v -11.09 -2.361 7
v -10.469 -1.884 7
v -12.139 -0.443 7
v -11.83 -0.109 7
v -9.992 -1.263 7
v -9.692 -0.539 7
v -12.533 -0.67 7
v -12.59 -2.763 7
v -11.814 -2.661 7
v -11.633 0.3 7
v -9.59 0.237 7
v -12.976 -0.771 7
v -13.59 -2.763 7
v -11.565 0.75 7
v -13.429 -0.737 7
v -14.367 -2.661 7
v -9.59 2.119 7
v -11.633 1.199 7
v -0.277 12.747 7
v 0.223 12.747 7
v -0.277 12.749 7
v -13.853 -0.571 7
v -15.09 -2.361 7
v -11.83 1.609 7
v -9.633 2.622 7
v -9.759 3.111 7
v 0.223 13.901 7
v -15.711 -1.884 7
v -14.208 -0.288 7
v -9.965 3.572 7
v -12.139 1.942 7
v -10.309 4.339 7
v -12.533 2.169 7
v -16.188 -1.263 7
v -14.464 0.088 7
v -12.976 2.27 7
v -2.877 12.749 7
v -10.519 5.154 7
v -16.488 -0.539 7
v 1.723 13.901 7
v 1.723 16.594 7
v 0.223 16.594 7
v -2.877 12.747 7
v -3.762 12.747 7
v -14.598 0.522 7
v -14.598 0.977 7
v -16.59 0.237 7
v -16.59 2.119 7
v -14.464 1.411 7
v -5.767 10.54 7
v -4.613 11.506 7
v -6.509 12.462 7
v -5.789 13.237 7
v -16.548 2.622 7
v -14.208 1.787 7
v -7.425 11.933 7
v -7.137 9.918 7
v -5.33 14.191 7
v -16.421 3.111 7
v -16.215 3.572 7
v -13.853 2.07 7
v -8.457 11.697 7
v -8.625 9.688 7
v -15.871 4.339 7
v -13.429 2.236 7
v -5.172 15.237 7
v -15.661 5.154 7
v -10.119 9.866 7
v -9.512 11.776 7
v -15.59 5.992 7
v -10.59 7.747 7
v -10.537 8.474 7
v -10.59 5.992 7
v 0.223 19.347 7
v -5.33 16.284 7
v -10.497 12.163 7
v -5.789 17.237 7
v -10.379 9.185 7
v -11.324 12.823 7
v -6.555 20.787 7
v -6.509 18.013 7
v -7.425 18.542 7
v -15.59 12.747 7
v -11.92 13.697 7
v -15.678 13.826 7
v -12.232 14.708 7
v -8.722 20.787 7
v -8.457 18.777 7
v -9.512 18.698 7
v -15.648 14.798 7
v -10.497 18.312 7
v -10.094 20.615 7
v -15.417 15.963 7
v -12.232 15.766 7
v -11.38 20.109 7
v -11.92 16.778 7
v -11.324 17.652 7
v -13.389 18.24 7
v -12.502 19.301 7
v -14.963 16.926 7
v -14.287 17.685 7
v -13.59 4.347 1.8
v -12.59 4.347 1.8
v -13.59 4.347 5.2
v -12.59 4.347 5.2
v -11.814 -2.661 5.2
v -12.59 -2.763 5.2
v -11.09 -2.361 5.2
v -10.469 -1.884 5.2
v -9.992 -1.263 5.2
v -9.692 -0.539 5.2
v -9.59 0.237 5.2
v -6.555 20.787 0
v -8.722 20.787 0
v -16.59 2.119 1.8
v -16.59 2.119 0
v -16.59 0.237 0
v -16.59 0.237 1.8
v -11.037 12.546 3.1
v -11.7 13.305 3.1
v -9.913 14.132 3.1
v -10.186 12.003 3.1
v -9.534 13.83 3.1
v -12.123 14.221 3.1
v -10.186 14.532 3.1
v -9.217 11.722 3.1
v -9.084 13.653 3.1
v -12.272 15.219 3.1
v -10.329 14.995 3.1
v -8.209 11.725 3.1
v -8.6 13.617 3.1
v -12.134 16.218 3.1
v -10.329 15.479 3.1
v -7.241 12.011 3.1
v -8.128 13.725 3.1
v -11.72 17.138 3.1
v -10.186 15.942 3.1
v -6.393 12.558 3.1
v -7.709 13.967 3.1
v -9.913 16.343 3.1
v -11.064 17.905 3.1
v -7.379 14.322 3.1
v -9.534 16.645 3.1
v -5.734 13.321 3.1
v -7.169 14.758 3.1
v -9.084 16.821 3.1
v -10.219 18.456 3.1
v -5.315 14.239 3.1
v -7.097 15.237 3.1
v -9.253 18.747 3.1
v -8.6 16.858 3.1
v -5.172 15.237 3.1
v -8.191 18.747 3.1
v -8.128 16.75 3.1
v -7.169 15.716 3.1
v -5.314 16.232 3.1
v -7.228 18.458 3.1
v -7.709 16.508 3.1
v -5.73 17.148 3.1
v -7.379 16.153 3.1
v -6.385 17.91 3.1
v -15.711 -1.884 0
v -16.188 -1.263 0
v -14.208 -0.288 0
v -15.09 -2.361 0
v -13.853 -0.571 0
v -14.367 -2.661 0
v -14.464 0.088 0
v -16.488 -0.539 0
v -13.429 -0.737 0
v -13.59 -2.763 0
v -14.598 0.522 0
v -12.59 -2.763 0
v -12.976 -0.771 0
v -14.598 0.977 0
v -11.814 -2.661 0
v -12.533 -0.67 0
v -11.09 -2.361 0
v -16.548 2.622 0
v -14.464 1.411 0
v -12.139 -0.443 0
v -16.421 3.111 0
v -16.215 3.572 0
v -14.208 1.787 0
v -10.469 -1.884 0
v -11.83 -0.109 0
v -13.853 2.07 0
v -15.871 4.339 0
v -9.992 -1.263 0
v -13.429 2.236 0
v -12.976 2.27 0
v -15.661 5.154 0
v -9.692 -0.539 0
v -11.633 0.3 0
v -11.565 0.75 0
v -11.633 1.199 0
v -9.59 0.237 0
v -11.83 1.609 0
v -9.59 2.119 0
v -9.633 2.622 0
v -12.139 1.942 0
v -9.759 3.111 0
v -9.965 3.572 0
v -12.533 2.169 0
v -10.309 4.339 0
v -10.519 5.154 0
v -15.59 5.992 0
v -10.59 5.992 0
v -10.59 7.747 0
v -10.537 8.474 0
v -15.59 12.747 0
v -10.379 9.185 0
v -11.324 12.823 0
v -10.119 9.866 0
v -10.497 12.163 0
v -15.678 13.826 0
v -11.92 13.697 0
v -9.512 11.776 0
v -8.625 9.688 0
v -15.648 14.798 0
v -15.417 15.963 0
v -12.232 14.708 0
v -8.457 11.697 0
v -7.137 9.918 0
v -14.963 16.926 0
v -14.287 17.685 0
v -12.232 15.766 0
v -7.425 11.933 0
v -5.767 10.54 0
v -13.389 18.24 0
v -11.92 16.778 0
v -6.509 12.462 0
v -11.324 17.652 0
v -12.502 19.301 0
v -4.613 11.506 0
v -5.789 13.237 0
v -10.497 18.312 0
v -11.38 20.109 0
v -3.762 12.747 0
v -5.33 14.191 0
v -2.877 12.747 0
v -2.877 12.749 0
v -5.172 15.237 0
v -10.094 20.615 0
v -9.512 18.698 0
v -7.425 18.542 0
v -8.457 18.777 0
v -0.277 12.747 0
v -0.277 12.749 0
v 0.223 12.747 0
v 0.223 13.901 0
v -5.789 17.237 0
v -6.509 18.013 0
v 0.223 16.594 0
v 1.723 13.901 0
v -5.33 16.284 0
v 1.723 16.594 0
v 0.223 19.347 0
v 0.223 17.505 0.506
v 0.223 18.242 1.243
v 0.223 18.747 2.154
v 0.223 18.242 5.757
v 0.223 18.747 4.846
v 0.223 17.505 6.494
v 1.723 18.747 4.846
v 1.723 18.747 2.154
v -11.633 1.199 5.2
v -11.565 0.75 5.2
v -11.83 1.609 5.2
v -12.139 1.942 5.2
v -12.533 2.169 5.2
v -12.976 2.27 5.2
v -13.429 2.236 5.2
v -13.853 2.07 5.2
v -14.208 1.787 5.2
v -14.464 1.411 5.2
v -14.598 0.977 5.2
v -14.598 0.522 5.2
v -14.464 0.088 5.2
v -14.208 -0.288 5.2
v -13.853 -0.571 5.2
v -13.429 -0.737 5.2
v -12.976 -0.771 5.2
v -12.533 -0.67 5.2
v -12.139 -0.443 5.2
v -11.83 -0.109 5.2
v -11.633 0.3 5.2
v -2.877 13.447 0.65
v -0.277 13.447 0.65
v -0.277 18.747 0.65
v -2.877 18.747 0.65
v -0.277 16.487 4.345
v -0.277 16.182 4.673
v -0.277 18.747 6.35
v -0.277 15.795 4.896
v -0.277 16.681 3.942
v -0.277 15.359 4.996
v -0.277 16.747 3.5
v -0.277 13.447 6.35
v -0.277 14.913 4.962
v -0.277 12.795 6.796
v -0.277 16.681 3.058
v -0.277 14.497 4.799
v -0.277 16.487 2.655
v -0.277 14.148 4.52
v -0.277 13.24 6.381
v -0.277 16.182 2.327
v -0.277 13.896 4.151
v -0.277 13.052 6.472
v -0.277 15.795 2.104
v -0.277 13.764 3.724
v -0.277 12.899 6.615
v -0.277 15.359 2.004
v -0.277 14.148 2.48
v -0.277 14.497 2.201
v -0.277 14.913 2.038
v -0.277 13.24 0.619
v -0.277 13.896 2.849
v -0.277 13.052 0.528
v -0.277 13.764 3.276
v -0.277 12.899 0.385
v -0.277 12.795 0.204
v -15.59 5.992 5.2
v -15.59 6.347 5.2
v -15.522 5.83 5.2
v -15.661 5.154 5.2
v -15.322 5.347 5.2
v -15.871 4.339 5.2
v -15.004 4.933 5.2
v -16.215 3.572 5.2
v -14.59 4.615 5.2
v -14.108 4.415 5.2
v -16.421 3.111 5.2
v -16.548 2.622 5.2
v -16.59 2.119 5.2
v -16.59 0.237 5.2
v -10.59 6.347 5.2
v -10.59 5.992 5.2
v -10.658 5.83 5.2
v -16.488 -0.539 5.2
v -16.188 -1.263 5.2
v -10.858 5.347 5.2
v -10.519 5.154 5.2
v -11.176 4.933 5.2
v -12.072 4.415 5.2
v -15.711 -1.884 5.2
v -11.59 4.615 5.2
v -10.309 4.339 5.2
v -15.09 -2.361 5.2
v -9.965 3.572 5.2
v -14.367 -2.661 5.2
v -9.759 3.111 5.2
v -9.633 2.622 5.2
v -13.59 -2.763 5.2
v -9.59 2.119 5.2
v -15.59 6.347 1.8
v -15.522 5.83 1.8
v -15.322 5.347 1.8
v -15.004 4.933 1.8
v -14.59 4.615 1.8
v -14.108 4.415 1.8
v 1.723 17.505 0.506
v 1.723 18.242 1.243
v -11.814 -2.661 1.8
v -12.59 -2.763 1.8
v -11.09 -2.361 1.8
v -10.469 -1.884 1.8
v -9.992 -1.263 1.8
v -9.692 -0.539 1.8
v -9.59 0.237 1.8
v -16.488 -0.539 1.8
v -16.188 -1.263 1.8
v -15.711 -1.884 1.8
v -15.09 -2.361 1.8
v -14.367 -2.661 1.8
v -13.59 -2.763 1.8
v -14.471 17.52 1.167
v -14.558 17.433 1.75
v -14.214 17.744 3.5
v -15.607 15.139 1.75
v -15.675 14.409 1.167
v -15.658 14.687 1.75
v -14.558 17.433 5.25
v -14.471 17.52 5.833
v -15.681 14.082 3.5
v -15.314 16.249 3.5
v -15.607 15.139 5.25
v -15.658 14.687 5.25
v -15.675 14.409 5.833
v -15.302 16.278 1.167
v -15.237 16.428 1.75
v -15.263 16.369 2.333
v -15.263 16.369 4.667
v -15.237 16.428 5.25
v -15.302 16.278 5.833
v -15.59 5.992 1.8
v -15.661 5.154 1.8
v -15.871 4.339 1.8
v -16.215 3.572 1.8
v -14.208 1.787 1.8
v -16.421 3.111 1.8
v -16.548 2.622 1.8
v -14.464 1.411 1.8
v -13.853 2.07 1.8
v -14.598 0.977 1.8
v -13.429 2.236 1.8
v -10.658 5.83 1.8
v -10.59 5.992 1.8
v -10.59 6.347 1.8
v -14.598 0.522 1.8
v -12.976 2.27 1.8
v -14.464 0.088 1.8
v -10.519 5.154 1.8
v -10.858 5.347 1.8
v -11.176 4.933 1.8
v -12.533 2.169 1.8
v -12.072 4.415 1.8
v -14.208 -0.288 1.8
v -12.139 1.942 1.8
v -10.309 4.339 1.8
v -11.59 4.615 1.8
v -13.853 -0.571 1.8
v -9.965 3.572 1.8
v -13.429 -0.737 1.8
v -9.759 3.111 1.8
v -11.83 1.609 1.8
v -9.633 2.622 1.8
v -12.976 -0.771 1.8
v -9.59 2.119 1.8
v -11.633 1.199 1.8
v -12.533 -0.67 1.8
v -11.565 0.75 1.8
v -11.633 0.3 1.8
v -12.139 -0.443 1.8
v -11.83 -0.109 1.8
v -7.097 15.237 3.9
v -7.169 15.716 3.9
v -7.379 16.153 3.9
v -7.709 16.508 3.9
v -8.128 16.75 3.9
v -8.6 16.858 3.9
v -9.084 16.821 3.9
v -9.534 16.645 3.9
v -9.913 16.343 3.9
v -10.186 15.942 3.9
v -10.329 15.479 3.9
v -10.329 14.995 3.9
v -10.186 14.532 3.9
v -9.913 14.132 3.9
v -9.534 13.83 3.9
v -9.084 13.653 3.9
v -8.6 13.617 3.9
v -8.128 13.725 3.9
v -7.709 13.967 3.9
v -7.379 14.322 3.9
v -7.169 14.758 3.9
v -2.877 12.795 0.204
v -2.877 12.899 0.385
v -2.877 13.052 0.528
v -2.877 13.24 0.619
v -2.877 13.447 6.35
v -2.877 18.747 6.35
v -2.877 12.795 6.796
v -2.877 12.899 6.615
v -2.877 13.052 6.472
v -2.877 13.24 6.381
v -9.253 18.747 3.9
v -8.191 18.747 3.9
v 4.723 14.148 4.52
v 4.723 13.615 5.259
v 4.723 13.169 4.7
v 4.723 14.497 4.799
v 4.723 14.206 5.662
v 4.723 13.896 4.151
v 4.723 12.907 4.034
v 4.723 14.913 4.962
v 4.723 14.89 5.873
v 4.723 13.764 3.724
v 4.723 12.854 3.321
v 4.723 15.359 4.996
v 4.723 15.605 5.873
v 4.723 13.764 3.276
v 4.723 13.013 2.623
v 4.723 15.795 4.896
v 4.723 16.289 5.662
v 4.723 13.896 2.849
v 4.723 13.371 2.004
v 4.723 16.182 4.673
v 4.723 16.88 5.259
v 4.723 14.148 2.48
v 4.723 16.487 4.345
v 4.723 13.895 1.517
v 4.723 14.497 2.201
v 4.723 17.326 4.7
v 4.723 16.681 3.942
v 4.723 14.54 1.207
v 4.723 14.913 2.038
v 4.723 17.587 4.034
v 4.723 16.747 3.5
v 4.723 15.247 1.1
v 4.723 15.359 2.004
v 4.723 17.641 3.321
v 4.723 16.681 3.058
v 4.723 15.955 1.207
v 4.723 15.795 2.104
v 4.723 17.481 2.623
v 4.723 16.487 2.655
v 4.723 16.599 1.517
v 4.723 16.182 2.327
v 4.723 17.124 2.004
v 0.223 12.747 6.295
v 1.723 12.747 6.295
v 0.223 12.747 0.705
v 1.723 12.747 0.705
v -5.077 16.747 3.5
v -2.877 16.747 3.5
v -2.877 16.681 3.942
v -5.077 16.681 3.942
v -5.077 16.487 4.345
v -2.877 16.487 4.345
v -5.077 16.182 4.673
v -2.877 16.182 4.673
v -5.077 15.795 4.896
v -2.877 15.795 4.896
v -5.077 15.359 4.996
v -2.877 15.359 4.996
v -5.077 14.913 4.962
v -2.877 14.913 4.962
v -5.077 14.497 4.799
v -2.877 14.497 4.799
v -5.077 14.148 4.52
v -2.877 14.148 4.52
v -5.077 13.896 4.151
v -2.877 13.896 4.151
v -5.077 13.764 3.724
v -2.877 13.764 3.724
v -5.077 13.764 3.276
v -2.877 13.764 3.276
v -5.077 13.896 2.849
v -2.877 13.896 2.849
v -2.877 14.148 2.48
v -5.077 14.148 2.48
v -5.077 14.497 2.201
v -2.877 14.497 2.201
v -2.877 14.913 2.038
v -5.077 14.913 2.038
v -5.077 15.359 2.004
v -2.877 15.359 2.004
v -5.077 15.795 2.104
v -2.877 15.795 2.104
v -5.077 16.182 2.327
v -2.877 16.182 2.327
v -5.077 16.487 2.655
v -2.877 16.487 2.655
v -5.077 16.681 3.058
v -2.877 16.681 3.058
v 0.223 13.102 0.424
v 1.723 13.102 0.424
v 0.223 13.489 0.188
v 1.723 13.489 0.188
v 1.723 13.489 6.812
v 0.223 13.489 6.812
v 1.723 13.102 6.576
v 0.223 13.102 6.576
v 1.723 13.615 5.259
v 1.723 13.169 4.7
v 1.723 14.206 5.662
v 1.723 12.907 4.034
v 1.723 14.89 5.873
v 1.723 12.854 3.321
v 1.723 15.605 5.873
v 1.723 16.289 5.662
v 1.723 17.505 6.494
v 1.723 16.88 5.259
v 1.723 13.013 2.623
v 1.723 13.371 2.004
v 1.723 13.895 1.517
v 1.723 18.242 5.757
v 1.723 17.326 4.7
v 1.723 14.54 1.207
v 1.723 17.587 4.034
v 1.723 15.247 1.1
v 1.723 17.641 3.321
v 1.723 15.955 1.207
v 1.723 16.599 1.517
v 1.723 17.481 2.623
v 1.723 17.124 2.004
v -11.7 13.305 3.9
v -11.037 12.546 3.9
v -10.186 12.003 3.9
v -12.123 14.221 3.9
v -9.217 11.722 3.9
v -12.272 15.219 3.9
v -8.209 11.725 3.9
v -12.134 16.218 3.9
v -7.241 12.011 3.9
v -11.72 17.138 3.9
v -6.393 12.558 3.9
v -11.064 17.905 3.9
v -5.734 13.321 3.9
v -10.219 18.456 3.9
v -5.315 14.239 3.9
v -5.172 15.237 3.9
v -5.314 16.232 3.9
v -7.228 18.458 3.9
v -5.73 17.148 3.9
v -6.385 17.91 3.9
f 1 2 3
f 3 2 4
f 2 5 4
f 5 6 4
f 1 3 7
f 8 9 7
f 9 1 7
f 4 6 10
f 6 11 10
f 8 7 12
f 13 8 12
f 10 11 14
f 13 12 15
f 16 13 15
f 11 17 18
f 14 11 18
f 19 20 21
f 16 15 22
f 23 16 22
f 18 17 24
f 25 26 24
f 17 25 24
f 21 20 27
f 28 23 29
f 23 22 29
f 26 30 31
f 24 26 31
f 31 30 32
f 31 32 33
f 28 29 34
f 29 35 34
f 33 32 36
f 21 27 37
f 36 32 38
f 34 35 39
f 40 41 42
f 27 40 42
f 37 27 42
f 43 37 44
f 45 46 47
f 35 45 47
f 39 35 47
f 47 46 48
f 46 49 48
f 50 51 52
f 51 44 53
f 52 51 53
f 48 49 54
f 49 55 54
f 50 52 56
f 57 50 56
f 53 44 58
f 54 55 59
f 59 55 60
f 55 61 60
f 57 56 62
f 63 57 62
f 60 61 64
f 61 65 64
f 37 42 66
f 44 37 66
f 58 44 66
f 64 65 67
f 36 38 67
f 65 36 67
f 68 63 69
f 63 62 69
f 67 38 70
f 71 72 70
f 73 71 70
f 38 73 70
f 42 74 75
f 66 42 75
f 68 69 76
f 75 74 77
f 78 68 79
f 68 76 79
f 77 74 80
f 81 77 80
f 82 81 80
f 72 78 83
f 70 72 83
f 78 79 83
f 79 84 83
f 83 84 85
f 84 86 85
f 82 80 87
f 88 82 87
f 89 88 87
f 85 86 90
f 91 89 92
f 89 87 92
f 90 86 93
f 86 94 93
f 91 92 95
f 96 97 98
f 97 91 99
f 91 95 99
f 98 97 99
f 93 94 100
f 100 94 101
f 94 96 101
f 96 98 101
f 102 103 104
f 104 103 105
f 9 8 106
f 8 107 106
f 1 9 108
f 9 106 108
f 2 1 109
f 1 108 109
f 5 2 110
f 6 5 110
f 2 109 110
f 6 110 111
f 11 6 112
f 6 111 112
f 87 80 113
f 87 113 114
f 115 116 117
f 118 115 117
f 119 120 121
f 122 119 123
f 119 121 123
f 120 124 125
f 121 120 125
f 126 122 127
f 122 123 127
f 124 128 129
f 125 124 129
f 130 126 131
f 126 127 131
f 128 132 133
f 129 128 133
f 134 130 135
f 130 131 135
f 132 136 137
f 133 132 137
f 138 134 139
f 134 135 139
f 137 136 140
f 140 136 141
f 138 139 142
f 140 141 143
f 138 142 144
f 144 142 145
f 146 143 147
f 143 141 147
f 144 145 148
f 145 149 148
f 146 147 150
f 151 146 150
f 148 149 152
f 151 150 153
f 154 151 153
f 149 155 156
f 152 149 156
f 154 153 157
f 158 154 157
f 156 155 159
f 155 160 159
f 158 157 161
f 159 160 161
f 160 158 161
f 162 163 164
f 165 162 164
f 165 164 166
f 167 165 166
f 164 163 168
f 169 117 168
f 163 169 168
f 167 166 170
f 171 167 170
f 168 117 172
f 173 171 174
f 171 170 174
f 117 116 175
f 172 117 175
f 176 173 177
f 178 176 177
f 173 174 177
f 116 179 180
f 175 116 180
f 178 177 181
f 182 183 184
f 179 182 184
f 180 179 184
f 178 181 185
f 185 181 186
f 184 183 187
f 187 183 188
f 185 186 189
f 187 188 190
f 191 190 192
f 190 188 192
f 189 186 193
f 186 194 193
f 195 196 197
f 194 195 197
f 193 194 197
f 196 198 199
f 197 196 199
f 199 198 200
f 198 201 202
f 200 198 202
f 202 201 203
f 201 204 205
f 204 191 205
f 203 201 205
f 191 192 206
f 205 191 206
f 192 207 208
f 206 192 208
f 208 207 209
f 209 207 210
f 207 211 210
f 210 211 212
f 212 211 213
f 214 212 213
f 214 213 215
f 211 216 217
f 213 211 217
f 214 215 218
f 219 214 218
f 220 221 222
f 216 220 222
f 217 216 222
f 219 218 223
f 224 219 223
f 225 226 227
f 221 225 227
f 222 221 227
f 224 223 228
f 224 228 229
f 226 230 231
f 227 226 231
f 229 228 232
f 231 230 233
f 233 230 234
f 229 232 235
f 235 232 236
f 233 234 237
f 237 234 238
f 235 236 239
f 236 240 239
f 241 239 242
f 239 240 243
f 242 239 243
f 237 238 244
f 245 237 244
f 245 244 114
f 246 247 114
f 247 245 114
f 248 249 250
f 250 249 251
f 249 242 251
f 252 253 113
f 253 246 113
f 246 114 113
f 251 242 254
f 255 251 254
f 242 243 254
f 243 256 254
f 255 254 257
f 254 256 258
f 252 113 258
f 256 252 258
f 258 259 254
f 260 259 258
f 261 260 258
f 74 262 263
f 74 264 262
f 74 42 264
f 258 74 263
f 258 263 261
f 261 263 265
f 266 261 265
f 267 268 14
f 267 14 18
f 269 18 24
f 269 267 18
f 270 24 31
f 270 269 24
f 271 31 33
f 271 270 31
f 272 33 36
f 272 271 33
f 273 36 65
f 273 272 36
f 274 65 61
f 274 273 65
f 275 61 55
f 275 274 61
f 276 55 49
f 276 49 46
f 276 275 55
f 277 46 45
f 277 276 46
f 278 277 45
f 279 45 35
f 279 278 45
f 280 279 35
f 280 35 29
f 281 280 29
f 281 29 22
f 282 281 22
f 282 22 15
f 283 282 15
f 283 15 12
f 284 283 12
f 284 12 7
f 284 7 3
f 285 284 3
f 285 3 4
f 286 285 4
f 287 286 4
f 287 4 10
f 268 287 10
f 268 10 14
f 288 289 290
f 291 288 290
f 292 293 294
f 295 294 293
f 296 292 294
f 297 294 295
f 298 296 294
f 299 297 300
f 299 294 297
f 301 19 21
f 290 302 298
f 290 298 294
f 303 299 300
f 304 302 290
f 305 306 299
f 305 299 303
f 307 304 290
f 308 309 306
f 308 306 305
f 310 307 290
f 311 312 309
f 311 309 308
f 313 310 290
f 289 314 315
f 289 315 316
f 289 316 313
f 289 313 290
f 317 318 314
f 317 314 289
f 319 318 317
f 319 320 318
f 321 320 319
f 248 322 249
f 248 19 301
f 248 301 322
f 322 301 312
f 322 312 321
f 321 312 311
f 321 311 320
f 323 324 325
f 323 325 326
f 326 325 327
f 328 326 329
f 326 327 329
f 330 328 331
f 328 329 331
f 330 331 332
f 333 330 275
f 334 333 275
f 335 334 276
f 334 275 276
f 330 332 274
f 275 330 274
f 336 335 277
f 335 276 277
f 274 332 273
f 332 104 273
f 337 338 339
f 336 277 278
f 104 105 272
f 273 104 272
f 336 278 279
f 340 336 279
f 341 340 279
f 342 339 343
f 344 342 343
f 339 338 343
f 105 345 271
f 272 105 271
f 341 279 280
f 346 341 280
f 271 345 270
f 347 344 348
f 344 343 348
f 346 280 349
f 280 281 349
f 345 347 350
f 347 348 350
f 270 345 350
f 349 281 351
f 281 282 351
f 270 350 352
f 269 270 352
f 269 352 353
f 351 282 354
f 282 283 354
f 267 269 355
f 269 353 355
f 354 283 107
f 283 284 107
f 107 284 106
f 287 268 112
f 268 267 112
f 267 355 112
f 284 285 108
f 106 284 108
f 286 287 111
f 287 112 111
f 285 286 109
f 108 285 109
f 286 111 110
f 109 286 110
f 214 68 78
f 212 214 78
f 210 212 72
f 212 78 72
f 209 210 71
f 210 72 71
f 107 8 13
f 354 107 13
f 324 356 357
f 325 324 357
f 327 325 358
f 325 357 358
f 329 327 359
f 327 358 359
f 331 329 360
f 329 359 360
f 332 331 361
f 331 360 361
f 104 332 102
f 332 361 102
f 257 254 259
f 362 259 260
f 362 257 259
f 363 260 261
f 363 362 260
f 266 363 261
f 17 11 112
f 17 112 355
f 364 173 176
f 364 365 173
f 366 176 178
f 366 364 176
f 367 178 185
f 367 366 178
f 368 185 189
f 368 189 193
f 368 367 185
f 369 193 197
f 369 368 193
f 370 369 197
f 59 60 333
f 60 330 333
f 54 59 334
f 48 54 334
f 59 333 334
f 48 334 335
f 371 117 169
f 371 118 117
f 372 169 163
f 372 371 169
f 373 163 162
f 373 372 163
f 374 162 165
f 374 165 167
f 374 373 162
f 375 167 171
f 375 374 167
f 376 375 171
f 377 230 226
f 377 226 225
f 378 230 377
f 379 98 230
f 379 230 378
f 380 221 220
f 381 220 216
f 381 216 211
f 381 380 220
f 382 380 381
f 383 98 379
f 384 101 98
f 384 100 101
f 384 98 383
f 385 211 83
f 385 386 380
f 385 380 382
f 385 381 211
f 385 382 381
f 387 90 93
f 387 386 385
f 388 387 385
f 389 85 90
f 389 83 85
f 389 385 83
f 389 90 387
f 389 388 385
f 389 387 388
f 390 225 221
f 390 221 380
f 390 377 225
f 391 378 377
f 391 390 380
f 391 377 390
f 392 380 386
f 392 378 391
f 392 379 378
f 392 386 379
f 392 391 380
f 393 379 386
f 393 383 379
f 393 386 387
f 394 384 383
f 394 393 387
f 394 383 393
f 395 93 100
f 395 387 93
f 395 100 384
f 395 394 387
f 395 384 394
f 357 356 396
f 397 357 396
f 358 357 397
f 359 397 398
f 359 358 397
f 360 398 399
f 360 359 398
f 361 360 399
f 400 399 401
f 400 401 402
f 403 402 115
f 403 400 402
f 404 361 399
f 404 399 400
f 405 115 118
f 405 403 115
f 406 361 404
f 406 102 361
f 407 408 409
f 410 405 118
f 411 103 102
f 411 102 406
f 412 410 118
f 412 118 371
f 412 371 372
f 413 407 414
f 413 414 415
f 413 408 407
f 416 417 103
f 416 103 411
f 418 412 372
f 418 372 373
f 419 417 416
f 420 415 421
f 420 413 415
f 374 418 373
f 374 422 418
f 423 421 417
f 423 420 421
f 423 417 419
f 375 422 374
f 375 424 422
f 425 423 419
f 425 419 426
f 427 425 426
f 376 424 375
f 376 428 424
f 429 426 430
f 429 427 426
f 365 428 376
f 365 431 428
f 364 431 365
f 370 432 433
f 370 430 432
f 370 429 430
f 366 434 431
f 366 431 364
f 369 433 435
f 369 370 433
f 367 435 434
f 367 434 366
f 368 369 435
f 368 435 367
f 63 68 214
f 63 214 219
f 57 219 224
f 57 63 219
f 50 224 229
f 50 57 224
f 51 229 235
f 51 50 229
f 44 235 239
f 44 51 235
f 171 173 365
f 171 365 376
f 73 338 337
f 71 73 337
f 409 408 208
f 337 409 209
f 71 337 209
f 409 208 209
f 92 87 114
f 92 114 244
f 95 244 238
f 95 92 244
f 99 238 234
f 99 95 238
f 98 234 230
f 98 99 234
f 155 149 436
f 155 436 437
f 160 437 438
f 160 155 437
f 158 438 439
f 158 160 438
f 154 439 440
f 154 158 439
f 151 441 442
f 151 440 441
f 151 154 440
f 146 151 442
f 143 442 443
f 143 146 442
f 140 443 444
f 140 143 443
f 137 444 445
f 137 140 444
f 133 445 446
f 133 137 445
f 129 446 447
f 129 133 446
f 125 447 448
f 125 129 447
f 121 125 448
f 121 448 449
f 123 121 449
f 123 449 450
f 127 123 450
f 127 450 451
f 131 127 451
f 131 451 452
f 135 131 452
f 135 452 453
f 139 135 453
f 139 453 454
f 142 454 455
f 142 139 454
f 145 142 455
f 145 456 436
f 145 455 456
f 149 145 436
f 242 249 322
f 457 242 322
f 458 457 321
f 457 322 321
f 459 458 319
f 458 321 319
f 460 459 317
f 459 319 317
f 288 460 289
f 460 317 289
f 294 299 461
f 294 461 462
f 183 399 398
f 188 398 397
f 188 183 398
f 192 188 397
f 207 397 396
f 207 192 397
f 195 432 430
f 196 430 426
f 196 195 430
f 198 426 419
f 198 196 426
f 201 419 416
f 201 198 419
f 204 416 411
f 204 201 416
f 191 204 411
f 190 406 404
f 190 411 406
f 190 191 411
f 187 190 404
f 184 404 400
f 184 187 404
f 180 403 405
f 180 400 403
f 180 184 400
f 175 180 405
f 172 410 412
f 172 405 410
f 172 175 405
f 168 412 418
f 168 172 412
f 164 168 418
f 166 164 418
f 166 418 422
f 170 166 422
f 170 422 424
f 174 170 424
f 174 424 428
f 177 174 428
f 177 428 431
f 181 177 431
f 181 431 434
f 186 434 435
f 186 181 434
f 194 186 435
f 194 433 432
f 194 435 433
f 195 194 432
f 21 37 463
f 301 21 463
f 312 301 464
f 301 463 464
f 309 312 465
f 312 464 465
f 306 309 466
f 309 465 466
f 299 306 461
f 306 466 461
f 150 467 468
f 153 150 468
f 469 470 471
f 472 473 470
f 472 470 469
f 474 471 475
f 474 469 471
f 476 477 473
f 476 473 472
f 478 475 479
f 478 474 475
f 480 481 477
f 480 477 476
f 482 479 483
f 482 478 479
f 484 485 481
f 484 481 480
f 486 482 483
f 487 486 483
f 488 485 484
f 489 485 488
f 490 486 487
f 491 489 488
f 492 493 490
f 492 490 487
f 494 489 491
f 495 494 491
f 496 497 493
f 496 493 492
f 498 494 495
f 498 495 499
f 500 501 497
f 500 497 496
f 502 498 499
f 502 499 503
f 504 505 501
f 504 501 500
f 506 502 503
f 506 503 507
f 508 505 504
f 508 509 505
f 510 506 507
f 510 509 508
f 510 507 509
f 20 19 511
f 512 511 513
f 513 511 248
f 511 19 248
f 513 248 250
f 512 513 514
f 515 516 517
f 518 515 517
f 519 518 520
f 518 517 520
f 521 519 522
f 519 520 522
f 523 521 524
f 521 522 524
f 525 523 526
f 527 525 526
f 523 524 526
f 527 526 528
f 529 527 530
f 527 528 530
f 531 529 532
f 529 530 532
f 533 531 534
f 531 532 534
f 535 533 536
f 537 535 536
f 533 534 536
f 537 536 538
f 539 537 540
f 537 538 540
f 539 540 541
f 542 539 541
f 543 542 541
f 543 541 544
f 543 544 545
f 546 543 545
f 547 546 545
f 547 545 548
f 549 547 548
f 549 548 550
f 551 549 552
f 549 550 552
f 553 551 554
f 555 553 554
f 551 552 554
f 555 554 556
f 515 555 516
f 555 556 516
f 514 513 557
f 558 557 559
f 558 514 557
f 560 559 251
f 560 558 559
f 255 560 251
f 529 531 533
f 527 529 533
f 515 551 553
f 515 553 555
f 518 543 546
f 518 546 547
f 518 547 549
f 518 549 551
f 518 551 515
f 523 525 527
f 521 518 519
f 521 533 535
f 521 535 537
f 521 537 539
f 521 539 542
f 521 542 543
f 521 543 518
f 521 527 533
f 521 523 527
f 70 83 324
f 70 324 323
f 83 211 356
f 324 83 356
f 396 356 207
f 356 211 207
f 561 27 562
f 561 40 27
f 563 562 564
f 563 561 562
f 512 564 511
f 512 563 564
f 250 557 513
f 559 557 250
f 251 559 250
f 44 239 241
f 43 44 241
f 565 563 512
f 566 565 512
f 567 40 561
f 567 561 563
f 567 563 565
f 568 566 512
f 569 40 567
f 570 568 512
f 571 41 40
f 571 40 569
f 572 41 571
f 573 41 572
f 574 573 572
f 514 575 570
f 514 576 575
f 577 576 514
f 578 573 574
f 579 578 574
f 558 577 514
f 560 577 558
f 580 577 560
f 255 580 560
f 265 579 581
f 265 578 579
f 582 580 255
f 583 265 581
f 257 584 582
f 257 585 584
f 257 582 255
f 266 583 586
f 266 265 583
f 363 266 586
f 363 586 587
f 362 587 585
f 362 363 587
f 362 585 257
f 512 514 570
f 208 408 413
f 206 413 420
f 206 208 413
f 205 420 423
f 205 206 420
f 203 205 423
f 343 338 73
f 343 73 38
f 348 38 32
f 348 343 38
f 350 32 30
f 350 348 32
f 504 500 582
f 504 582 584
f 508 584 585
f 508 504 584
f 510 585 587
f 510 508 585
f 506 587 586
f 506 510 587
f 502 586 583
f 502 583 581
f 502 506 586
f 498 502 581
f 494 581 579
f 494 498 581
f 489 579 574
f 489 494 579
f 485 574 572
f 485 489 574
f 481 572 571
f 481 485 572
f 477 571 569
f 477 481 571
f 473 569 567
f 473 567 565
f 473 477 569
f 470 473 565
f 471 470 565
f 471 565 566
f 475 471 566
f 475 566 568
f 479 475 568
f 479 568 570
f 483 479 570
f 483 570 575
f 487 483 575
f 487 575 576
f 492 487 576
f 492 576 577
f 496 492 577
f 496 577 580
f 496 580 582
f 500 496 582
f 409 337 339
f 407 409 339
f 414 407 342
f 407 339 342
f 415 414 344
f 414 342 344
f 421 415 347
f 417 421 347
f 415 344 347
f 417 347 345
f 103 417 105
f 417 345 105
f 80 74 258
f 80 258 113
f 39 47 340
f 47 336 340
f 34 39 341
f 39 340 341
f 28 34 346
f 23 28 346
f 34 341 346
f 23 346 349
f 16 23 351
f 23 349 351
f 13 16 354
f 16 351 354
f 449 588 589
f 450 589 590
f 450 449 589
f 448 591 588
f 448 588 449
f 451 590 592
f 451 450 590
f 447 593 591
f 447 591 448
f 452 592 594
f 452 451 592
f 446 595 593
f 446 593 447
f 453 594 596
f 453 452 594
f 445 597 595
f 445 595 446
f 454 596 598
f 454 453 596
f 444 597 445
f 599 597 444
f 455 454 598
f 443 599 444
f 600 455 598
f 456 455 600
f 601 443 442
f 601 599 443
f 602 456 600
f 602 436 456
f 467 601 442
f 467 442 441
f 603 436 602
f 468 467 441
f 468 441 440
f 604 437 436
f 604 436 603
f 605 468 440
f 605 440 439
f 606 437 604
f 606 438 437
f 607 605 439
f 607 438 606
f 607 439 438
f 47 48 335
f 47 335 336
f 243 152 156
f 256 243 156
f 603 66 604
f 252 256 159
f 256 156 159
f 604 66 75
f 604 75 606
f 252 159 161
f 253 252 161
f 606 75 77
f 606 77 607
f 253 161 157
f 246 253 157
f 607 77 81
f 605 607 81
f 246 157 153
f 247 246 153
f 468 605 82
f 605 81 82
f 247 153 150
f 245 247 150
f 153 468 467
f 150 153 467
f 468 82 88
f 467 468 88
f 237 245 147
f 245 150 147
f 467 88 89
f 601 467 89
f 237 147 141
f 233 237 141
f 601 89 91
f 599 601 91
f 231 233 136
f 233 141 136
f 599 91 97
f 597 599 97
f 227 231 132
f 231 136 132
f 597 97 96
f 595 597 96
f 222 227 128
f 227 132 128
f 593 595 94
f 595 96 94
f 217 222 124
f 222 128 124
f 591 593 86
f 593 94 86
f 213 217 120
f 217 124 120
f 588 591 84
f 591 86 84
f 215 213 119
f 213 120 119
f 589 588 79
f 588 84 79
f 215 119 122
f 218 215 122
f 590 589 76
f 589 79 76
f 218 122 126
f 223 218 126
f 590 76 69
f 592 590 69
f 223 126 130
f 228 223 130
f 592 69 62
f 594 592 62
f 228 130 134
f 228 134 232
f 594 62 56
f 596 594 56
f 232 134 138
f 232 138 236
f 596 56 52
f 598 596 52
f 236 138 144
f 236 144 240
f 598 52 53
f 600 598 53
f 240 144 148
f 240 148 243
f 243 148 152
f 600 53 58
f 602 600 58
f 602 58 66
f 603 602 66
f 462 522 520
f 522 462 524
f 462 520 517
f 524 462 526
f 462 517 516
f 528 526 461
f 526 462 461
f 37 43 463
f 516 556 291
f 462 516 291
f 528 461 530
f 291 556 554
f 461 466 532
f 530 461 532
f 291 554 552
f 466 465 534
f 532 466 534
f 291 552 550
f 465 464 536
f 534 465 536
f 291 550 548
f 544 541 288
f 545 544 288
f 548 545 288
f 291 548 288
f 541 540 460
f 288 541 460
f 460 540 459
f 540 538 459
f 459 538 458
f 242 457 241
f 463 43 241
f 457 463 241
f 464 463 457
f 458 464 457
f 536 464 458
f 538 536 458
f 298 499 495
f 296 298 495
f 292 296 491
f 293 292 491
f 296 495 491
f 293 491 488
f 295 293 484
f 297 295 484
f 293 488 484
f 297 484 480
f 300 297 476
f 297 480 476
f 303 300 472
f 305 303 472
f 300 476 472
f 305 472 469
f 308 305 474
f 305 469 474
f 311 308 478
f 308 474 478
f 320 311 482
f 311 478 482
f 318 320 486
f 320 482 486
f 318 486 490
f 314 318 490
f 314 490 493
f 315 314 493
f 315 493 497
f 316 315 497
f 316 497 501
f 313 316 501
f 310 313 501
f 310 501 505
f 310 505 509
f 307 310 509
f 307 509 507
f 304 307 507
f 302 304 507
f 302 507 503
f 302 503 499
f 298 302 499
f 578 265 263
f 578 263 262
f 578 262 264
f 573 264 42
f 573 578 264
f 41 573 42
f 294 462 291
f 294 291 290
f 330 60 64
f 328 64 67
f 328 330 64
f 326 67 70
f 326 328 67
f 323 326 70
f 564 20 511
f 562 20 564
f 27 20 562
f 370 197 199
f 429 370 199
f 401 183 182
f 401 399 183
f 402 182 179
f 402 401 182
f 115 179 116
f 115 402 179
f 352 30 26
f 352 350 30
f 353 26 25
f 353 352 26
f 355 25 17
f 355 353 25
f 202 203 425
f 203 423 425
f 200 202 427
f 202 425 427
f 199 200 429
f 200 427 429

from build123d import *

# Parameters (mm, degrees)
SKETCH1_R           = 1.625
SKETCH1_R_2         = 1.525
BOSS_EXTRUDE1_DEPTH = 7
SKETCH2_R           = 1.5
CUT_EXTRUDE1_DEPTH  = 3
SKETCH3_W           = 10.588435917
SKETCH3_H           = 3.4
CUT_EXTRUDE2_DEPTH  = 6.11
FILLET1_R           = 5
BOSS_EXTRUDE2_DEPTH = 7
BOSS_EXTRUDE3_DEPTH = 1.8
BOSS_EXTRUDE4_START = -7
BOSS_EXTRUDE4_DEPTH = 1.8
FILLET4_R           = 5
FILLET5_R           = 3
FILLET6_R           = 2
CUT_EXTRUDE3_START  = -3
SKETCH8_W           = 5.7
SKETCH8_H           = 8.259283933
CUT_EXTRUDE3_DEPTH  = 2.6
FILLET7_R           = 0.7
SKETCH9_R           = 5.326360015
SKETCH9_R_2         = 3.75
CUT_EXTRUDE5_DEPTH  = 2.5
SKETCH10_R          = 4.869989517
SKETCH10_R_2        = 2.4
CUT_EXTRUDE6_DEPTH  = 1
BOSS_EXTRUDE5_START = 2
SKETCH11_R          = 2.4
SKETCH11_R_2        = 1.5
BOSS_EXTRUDE5_DEPTH = 2
CUT_EXTRUDE7_START  = -7
SKETCH12_R          = 3.575
CUT_EXTRUDE7_DEPTH  = 3.1
CUT_EXTRUDE8_START  = -3.1
SKETCH14_R          = 3.575
CUT_EXTRUDE8_DEPTH  = 3.1
SKETCH15_R          = 5.55
SKETCH15_R_2        = 3.55
BOSS_EXTRUDE6_DEPTH = 7
SKETCH16_R          = 1.407083064
BOSS_EXTRUDE7_DEPTH = 1
SKETCH17_R          = 1.5
CUT_EXTRUDE9_DEPTH  = 2.2
BOSS_EXTRUDE8_DEPTH = 7
CUT_EXTRUDE10_START = -3.1
SKETCH19_R          = 3.55
CUT_EXTRUDE10_DEPTH = 3.1


with BuildPart() as part:
    # Sketch1 → Boss-Extrude1 (new body)
    with BuildSketch(Plane.XY):
        Polygon((2.722541385, 17.747241978), (-15.590111015, 17.747241978), (-15.590111015, -1.762758022), (-10.590111015, -1.762758022), (-10.590111015, 9.80448846), (-10.590111015, 12.747241978), (2.722541385, 12.747241978), align=None)
        with Locations((-8.721930535, 15.237241978)):
            Circle(SKETCH1_R, mode=Mode.SUBTRACT)
        with Locations((-13.090111015, 0.749566092)):
            Circle(SKETCH1_R_2, mode=Mode.SUBTRACT)
    extrude(amount=BOSS_EXTRUDE1_DEPTH)

    # Sketch2 → Cut-Extrude1 (cut)
    with BuildSketch(Plane(origin=(2.722541385, 0, 0), x_dir=(0, 0, -1), z_dir=(1, 0, 0))):
        with Locations(Location((-3.5, 15.247241978, 0), (0, 0, 90))):
            Circle(SKETCH2_R)
    extrude(amount=-CUT_EXTRUDE1_DEPTH, mode=Mode.SUBTRACT)

    # Sketch3 → Cut-Extrude2 (cut)
    with BuildSketch(Plane.XZ.offset(1.762758022)):
        with Locations((-13.988004801, 3.5)):
            Rectangle(SKETCH3_W, SKETCH3_H)
    extrude(amount=-CUT_EXTRUDE2_DEPTH, mode=Mode.SUBTRACT)

    # Fillet1
    fillet1_edges = [part.edges().sort_by_distance(p)[0] for p in [
        (-10.590111015, 12.747241978, 3.5),
        (-15.590111015, 17.747241978, 3.5),
    ]]
    fillet(fillet1_edges, radius=FILLET1_R)

    # Sketch5 → Boss-Extrude2 (add)
    with BuildSketch(Plane.XY.offset(7)):
        with BuildLine():
            Line((2.722541385, 17.747241978), (-10.590111015, 17.747241978))
            Line((-10.590111015, 17.747241978), (-15.590111015, 12.747241978))
            add(Edge.make_bspline(
                [(-10.590111015, 18.747241978), (-16.362035667, 18.743656789), (-15.590111015, 12.747241978)],
                knots=[0, 0, 0, 1, 1, 1], degree=2))
            Line((-10.590111015, 18.747241978), (2.722541385, 18.747241978))
            Line((2.722541385, 18.747241978), (2.722541385, 17.747241978))
        make_face()
    extrude(amount=-BOSS_EXTRUDE2_DEPTH)

    # Sketch7 → Boss-Extrude3 (add)
    with BuildSketch(Plane.XY.offset(7)):
        Polygon((-10.590111015, -1.762758022), (-10.590111015, 2.992241978), (-9.590111015, 2.992241978), (-9.590111015, -1.762758022), (-9.590111015, -2.762758022), (-16.590111015, -2.762758022), (-16.590111015, -1.762758022), (-16.590111015, 2.992241978), (-15.590111015, 2.992241978), (-15.590111015, -1.762758022), align=None)
    extrude(amount=-BOSS_EXTRUDE3_DEPTH)

    # Sketch7<2> → Boss-Extrude4 (add)
    with BuildSketch(Plane.XY.offset(7).offset(BOSS_EXTRUDE4_START)):
        Polygon((-10.590111015, -1.762758022), (-10.590111015, 2.992241978), (-9.590111015, 2.992241978), (-9.590111015, -1.762758022), (-9.590111015, -2.762758022), (-16.590111015, -2.762758022), (-16.590111015, -1.762758022), (-16.590111015, 2.992241978), (-15.590111015, 2.992241978), (-15.590111015, -1.762758022), align=None)
    extrude(amount=BOSS_EXTRUDE4_DEPTH)

    # Fillet4
    # the kernel refuses this fillet: 5 mm, written as the material it adds along each edge
    with BuildSketch(Plane(origin=(-15.590111015, 2.992241978, 0), x_dir=(0, 1, 0), z_dir=(0, 0, 1))) as fillet4_piece_1_section:
        with BuildLine():
            CenterArc((3, 5), FILLET4_R, 233.130102354, 36.869897646)
            Line((0, 1), (-0.06, 0.92))
            ThreePointArc((-0.06, 0.92), (-0.1, 0.5), (-0.1, 0))
            Line((-0.1, 0), (0, -0.1))
            Line((0, -0.1), (3, -0.1))
            Line((3, -0.1), (3, 0))
        make_face()
    fillet4_piece_1 = extrude(amount=1.8, mode=Mode.PRIVATE)
    fillet4_piece_1 = split(fillet4_piece_1, bisect_by=Plane(origin=(-15.603784391, 4.347241978, 0.9), z_dir=(0, 1, 0)), keep=Keep.TOP, mode=Mode.PRIVATE)
    add(fillet4_piece_1)
    with BuildSketch(Plane(origin=(-15.590111015, 2.992241978, 0), x_dir=(0, 1, 0), z_dir=(0, 0, 1))) as fillet4_piece_2_section:
        with BuildLine():
            CenterArc((3, 5), FILLET4_R, 233.130102354, 36.869897646)
            Line((0, 1), (-0.06, 0.92))
            ThreePointArc((-0.06, 0.92), (-0.1, 0.5), (-0.1, 0))
            Line((-0.1, 0), (0, -0.1))
            Line((0, -0.1), (3, -0.1))
            Line((3, -0.1), (3, 0))
        make_face()
    fillet4_piece_2 = extrude(amount=1.8, mode=Mode.PRIVATE)
    fillet4_piece_2 = split(fillet4_piece_2, bisect_by=Plane(origin=(-15.881039753, 4.347241978, 0.9), z_dir=(0, -1, 0)), keep=Keep.TOP, mode=Mode.PRIVATE)
    add(fillet4_piece_2)
    with BuildSketch(Plane(origin=(-15.590111015, 2.992241978, 0), x_dir=(0, 1, 0), z_dir=(0, 0, 1))) as fillet4_piece_3_section:
        with BuildLine():
            CenterArc((3, 5), FILLET4_R, 233.130102354, 36.869897646)
            Line((0, 1), (-0.06, 0.92))
            ThreePointArc((-0.06, 0.92), (-0.1, 0.5), (-0.1, 0))
            Line((-0.1, 0), (0, -0.1))
            Line((0, -0.1), (3, -0.1))
            Line((3, -0.1), (3, 0))
        make_face()
    fillet4_piece_3 = extrude(amount=9.3, mode=Mode.PRIVATE)
    fillet4_piece_3 = split(fillet4_piece_3, bisect_by=Plane(origin=(-15.603784391, 4.971879793, 1.8), z_dir=(0, 0, 1)), keep=Keep.TOP, mode=Mode.PRIVATE)
    fillet4_piece_3 = split(fillet4_piece_3, bisect_by=Plane(origin=(-15.603784391, 4.347241978, 3.5), z_dir=(0, 1, 0)), keep=Keep.TOP, mode=Mode.PRIVATE)
    fillet4_piece_3 = split(fillet4_piece_3, bisect_by=Plane(origin=(-15.603784391, 4.971879793, 5.2), z_dir=(0, 0, -1)), keep=Keep.TOP, mode=Mode.PRIVATE)
    add(fillet4_piece_3)
    with BuildSketch(Plane(origin=(-15.590111015, 2.992241978, 0), x_dir=(0, 1, 0), z_dir=(0, 0, 1))) as fillet4_piece_4_section:
        with BuildLine():
            CenterArc((3, 5), FILLET4_R, 233.130102354, 36.869897646)
            Line((0, 1), (-0.06, 0.92))
            ThreePointArc((-0.06, 0.92), (-0.1, 0.5), (-0.1, 0))
            Line((-0.1, 0), (0, -0.1))
            Line((0, -0.1), (3, -0.1))
            Line((3, -0.1), (3, 0))
        make_face()
    fillet4_piece_4 = extrude(amount=9.3, mode=Mode.PRIVATE)
    fillet4_piece_4 = split(fillet4_piece_4, bisect_by=Plane(origin=(-15.603784391, 4.347241978, 6.1), z_dir=(0, 1, 0)), keep=Keep.TOP, mode=Mode.PRIVATE)
    fillet4_piece_4 = split(fillet4_piece_4, bisect_by=Plane(origin=(-15.603784391, 4.971879793, 5.2), z_dir=(0, 0, 1)), keep=Keep.TOP, mode=Mode.PRIVATE)
    fillet4_piece_4 = split(fillet4_piece_4, bisect_by=Plane(origin=(-15.603784391, 4.971879793, 7), z_dir=(0, 0, -1)), keep=Keep.TOP, mode=Mode.PRIVATE)
    add(fillet4_piece_4)
    with BuildSketch(Plane(origin=(-15.590111015, 2.992241978, 0), x_dir=(0, 1, 0), z_dir=(0, 0, 1))) as fillet4_piece_5_section:
        with BuildLine():
            CenterArc((3, 5), FILLET4_R, 233.130102354, 36.869897646)
            Line((0, 1), (-0.06, 0.92))
            ThreePointArc((-0.06, 0.92), (-0.1, 0.5), (-0.1, 0))
            Line((-0.1, 0), (0, -0.1))
            Line((0, -0.1), (3, -0.1))
            Line((3, -0.1), (3, 0))
        make_face()
    fillet4_piece_5 = extrude(amount=9.3, mode=Mode.PRIVATE)
    fillet4_piece_5 = split(fillet4_piece_5, bisect_by=Plane(origin=(-15.881039753, 4.347241978, 6.1), z_dir=(0, -1, 0)), keep=Keep.TOP, mode=Mode.PRIVATE)
    fillet4_piece_5 = split(fillet4_piece_5, bisect_by=Plane(origin=(-15.881039753, 3.497683508, 5.2), z_dir=(0, 0, 1)), keep=Keep.TOP, mode=Mode.PRIVATE)
    fillet4_piece_5 = split(fillet4_piece_5, bisect_by=Plane(origin=(-15.881039753, 3.497683508, 7), z_dir=(0, 0, -1)), keep=Keep.TOP, mode=Mode.PRIVATE)
    add(fillet4_piece_5)
    with BuildSketch(Plane(origin=(-10.590111015, 2.992241978, 0), x_dir=(0, 1, 0), z_dir=(0, 0, 1))) as fillet4_piece_6_section:
        with BuildLine():
            CenterArc((3, -5), FILLET4_R, 90, 36.869897646)
            Line((0, -1), (-0.06, -0.92))
            ThreePointArc((-0.06, -0.92), (-0.1, -0.5), (-0.1, 0))
            Line((-0.1, 0), (0, 0.1))
            Line((0, 0.1), (3, 0.1))
            Line((3, 0.1), (3, 0))
        make_face()
    fillet4_piece_6 = extrude(amount=1.8, mode=Mode.PRIVATE)
    fillet4_piece_6 = split(fillet4_piece_6, bisect_by=Plane(origin=(-10.576437639, 4.347241978, 0.9), z_dir=(0, 1, 0)), keep=Keep.TOP, mode=Mode.PRIVATE)
    add(fillet4_piece_6)
    with BuildSketch(Plane(origin=(-10.590111015, 2.992241978, 0), x_dir=(0, 1, 0), z_dir=(0, 0, 1))) as fillet4_piece_7_section:
        with BuildLine():
            CenterArc((3, -5), FILLET4_R, 90, 36.869897646)
            Line((0, -1), (-0.06, -0.92))
            ThreePointArc((-0.06, -0.92), (-0.1, -0.5), (-0.1, 0))
            Line((-0.1, 0), (0, 0.1))
            Line((0, 0.1), (3, 0.1))
            Line((3, 0.1), (3, 0))
        make_face()
    fillet4_piece_7 = extrude(amount=1.8, mode=Mode.PRIVATE)
    fillet4_piece_7 = split(fillet4_piece_7, bisect_by=Plane(origin=(-10.299182277, 4.347241978, 0.9), z_dir=(0, -1, 0)), keep=Keep.TOP, mode=Mode.PRIVATE)
    add(fillet4_piece_7)
    with BuildSketch(Plane(origin=(-10.590111015, 2.992241978, 0), x_dir=(0, 1, 0), z_dir=(0, 0, 1))) as fillet4_piece_8_section:
        with BuildLine():
            CenterArc((3, -5), FILLET4_R, 90, 36.869897646)
            Line((0, -1), (-0.06, -0.92))
            ThreePointArc((-0.06, -0.92), (-0.1, -0.5), (-0.1, 0))
            Line((-0.1, 0), (0, 0.1))
            Line((0, 0.1), (3, 0.1))
            Line((3, 0.1), (3, 0))
        make_face()
    fillet4_piece_8 = extrude(amount=9.3, mode=Mode.PRIVATE)
    fillet4_piece_8 = split(fillet4_piece_8, bisect_by=Plane(origin=(-10.576437639, 4.971879793, 5.2), z_dir=(0, 0, -1)), keep=Keep.TOP, mode=Mode.PRIVATE)
    fillet4_piece_8 = split(fillet4_piece_8, bisect_by=Plane(origin=(-10.576437639, 4.347241978, 3.5), z_dir=(0, 1, 0)), keep=Keep.TOP, mode=Mode.PRIVATE)
    fillet4_piece_8 = split(fillet4_piece_8, bisect_by=Plane(origin=(-10.576437639, 4.971879793, 1.8), z_dir=(0, 0, 1)), keep=Keep.TOP, mode=Mode.PRIVATE)
    add(fillet4_piece_8)
    with BuildSketch(Plane(origin=(-10.590111015, 2.992241978, 0), x_dir=(0, 1, 0), z_dir=(0, 0, 1))) as fillet4_piece_9_section:
        with BuildLine():
            CenterArc((3, -5), FILLET4_R, 90, 36.869897646)
            Line((0, -1), (-0.06, -0.92))
            ThreePointArc((-0.06, -0.92), (-0.1, -0.5), (-0.1, 0))
            Line((-0.1, 0), (0, 0.1))
            Line((0, 0.1), (3, 0.1))
            Line((3, 0.1), (3, 0))
        make_face()
    fillet4_piece_9 = extrude(amount=9.3, mode=Mode.PRIVATE)
    fillet4_piece_9 = split(fillet4_piece_9, bisect_by=Plane(origin=(-10.576437639, 4.971879793, 7), z_dir=(0, 0, -1)), keep=Keep.TOP, mode=Mode.PRIVATE)
    fillet4_piece_9 = split(fillet4_piece_9, bisect_by=Plane(origin=(-10.576437639, 4.971879793, 5.2), z_dir=(0, 0, 1)), keep=Keep.TOP, mode=Mode.PRIVATE)
    fillet4_piece_9 = split(fillet4_piece_9, bisect_by=Plane(origin=(-10.576437639, 4.347241978, 6.1), z_dir=(0, 1, 0)), keep=Keep.TOP, mode=Mode.PRIVATE)
    add(fillet4_piece_9)
    with BuildSketch(Plane(origin=(-10.590111015, 2.992241978, 0), x_dir=(0, 1, 0), z_dir=(0, 0, 1))) as fillet4_piece_10_section:
        with BuildLine():
            CenterArc((3, -5), FILLET4_R, 90, 36.869897646)
            Line((0, -1), (-0.06, -0.92))
            ThreePointArc((-0.06, -0.92), (-0.1, -0.5), (-0.1, 0))
            Line((-0.1, 0), (0, 0.1))
            Line((0, 0.1), (3, 0.1))
            Line((3, 0.1), (3, 0))
        make_face()
    fillet4_piece_10 = extrude(amount=9.3, mode=Mode.PRIVATE)
    fillet4_piece_10 = split(fillet4_piece_10, bisect_by=Plane(origin=(-10.299182277, 3.497683508, 7), z_dir=(0, 0, -1)), keep=Keep.TOP, mode=Mode.PRIVATE)
    fillet4_piece_10 = split(fillet4_piece_10, bisect_by=Plane(origin=(-10.299182277, 3.497683508, 5.2), z_dir=(0, 0, 1)), keep=Keep.TOP, mode=Mode.PRIVATE)
    fillet4_piece_10 = split(fillet4_piece_10, bisect_by=Plane(origin=(-10.299182277, 4.347241978, 6.1), z_dir=(0, -1, 0)), keep=Keep.TOP, mode=Mode.PRIVATE)
    add(fillet4_piece_10)

    # Fillet5
    fillet5_edges = [part.edges().sort_by_distance(p)[0] for p in [
        (-9.590111015, 2.992241978, 6.1),
        (-9.590111015, -2.762758022, 6.1),
        (-16.590111015, -2.762758022, 6.1),
        (-16.590111015, 2.992241978, 6.1),
        (-9.590111015, 2.992241978, 0.9),
        (-9.590111015, -2.762758022, 0.9),
        (-16.590111015, -2.762758022, 0.9),
        (-16.590111015, 2.992241978, 0.9),
    ]]
    fillet(fillet5_edges, radius=FILLET5_R)

    # Fillet6
    # the kernel refuses this fillet: 2 mm, written as the material it takes off along each edge
    with BuildSketch(Plane(origin=(-15.868461409, 4.347241978, 1.8), x_dir=(1, 0, 0), z_dir=(0, 0, 1))) as fillet6_piece_1:
        with BuildLine():
            CenterArc((2.278350394, 2), FILLET6_R, 180, 90)
            Line((0.278350394, 2), (0.078350394, 2))
            ThreePointArc((0.078350394, 2), (0.078350394, 1.645), (-0.188865984, 0.0658))
            Line((-0.188865984, 0.0658), (0, -0.2))
            Line((0, -0.2), (2.278350394, -0.2))
            Line((2.278350394, -0.2), (2.278350394, 0))
        make_face()
    extrude(amount=3.4, mode=Mode.SUBTRACT)
    with BuildSketch(Plane(origin=(-10.311760621, 4.347241978, 5.2), x_dir=(-0.13784657416957666, 0.9904535940616861, 0), z_dir=(0, 0, -1))) as fillet6_piece_2:
        with BuildLine():
            CenterArc((2.294969985, -1.980907188), FILLET6_R, 97.923255875, 90)
            Line((0.314062797, -2.256600336), (0.115972078, -2.284169651))
            Line((0.115972078, -2.284169651), (-0.198090719, -0.027569315))
            Line((-0.198090719, -0.027569315), (0.039137318, 0.196133297))
            ThreePointArc((0.039137318, 0.196133297), (1.640096496, 0.149155185), (1.991707522, 0.198090719))
            Line((1.991707522, 0.198090719), (2.019276836, 0))
        make_face()
    extrude(amount=3.4, mode=Mode.SUBTRACT)

    # Sketch8 → Cut-Extrude3 (cut)
    with BuildSketch(Plane(origin=(2.722541385, 0, 0), x_dir=(0, 0, -1), z_dir=(1, 0, 0)).offset(CUT_EXTRUDE3_START)):
        with Locations((-3.5, 15.247241978)):
            Rectangle(SKETCH8_W, SKETCH8_H)
    extrude(amount=-CUT_EXTRUDE3_DEPTH, mode=Mode.SUBTRACT)

    # Fillet7
    # the kernel refuses this fillet: 0.7 mm, written as the material it takes off along each edge
    with BuildSketch(Plane(origin=(-0.277458615, 12.747241978, 0.65), x_dir=(0, 0, -1), z_dir=(-1, 0, 0)), Plane(origin=(-2.877458615, 12.747241978, 6.35), x_dir=(0, 0, 1), z_dir=(1, 0, 0))) as fillet7_piece_1:
        with BuildLine():
            CenterArc((FILLET7_R, -FILLET7_R), FILLET7_R, 90, 90)
            Line((0, -FILLET7_R), (0, 0))
            Line((0, 0), (FILLET7_R, 0))
        make_face()
    extrude(amount=2.6, mode=Mode.SUBTRACT)

    # Sketch9 → Cut-Extrude5 (cut)
    with BuildSketch(Plane(origin=(2.722541385, 0, 0), x_dir=(0, 0, -1), z_dir=(1, 0, 0))):
        with Locations((-3.5, 15.247241978)):
            Circle(SKETCH9_R)
        with Locations((-3.5, 15.247241978)):
            Circle(SKETCH9_R_2, mode=Mode.SUBTRACT)
    extrude(amount=-CUT_EXTRUDE5_DEPTH, mode=Mode.SUBTRACT)

    # Sketch10 → Cut-Extrude6 (cut)
    with BuildSketch(Plane(origin=(2.722541385, 0, 0), x_dir=(0, 0, -1), z_dir=(1, 0, 0))):
        with Locations((-3.5, 15.247241978)):
            Circle(SKETCH10_R)
        with Locations((-3.5, 15.247241978)):
            Circle(SKETCH10_R_2, mode=Mode.SUBTRACT)
    extrude(amount=-CUT_EXTRUDE6_DEPTH, mode=Mode.SUBTRACT)

    # Sketch11 → Boss-Extrude5 (add)
    with BuildSketch(Plane(origin=(2.722541385, 0, 0), x_dir=(0, 0, -1), z_dir=(1, 0, 0)).offset(BOSS_EXTRUDE5_START)):
        with Locations((-3.5, 15.247241978)):
            Circle(SKETCH11_R)
        with Locations(Location((-3.5, 15.247241978, 0), (0, 0, 90))):
            Circle(SKETCH11_R_2, mode=Mode.SUBTRACT)
    extrude(amount=-BOSS_EXTRUDE5_DEPTH)

    # Sketch12 → Cut-Extrude7 (cut)
    with BuildSketch(Plane.XY.offset(7).offset(CUT_EXTRUDE7_START)):
        with Locations((-8.721930535, 15.237241978)):
            Circle(SKETCH12_R)
    extrude(amount=CUT_EXTRUDE7_DEPTH, mode=Mode.SUBTRACT)

    # Sketch14 → Cut-Extrude8 (cut)
    with BuildSketch(Plane.XY.offset(7).offset(CUT_EXTRUDE8_START)):
        with Locations((-8.721930535, 15.237241978)):
            Circle(SKETCH14_R)
    extrude(amount=CUT_EXTRUDE8_DEPTH, mode=Mode.SUBTRACT)

    # Sketch15 → Boss-Extrude6 (add)
    with BuildSketch(Plane.XY.offset(7)):
        with Locations((-8.721930535, 15.237241978)):
            Circle(SKETCH15_R)
        with Locations((-8.721930535, 15.237241978)):
            Circle(SKETCH15_R_2, mode=Mode.SUBTRACT)
    extrude(amount=-BOSS_EXTRUDE6_DEPTH)

    # Sketch16 → Boss-Extrude7 (add)
    with BuildSketch(Plane.XY.offset(3.9)):
        with Locations((-7.473849804, 12.118973855)):
            Circle(SKETCH16_R)
    extrude(amount=-BOSS_EXTRUDE7_DEPTH)

    # Sketch17 → Cut-Extrude9 (cut)
    with BuildSketch(Plane(origin=(-2.877458615, 0, 0), x_dir=(0, 0, -1), z_dir=(1, 0, 0))):
        with Locations(Location((-3.5, 15.247241978, 0), (0, 0, 90))):
            Circle(SKETCH17_R)
    extrude(amount=-CUT_EXTRUDE9_DEPTH, mode=Mode.SUBTRACT)

    # Sketch18 → Boss-Extrude8 (add)
    with BuildSketch(Plane.XY.offset(7)):
        Polygon((-4.697631712, 18.747241978), (0.222541385, 18.747241978), (0.222541385, 19.347241978), (-6.555314255, 20.787241978), (-8.721930535, 20.787241978), align=None)
    extrude(amount=-BOSS_EXTRUDE8_DEPTH)

    # Sketch19 → Cut-Extrude10 (cut)
    with BuildSketch(Plane(origin=(0, 0, 0), x_dir=(-1, 0, 0), z_dir=(0, 0, -1)).offset(CUT_EXTRUDE10_START)):
        with Locations(Location((8.721930535, 15.237241978, 0), (0, 0, 180))):
            Circle(SKETCH19_R)
    extrude(amount=CUT_EXTRUDE10_DEPTH, mode=Mode.SUBTRACT)


solid = part.part
